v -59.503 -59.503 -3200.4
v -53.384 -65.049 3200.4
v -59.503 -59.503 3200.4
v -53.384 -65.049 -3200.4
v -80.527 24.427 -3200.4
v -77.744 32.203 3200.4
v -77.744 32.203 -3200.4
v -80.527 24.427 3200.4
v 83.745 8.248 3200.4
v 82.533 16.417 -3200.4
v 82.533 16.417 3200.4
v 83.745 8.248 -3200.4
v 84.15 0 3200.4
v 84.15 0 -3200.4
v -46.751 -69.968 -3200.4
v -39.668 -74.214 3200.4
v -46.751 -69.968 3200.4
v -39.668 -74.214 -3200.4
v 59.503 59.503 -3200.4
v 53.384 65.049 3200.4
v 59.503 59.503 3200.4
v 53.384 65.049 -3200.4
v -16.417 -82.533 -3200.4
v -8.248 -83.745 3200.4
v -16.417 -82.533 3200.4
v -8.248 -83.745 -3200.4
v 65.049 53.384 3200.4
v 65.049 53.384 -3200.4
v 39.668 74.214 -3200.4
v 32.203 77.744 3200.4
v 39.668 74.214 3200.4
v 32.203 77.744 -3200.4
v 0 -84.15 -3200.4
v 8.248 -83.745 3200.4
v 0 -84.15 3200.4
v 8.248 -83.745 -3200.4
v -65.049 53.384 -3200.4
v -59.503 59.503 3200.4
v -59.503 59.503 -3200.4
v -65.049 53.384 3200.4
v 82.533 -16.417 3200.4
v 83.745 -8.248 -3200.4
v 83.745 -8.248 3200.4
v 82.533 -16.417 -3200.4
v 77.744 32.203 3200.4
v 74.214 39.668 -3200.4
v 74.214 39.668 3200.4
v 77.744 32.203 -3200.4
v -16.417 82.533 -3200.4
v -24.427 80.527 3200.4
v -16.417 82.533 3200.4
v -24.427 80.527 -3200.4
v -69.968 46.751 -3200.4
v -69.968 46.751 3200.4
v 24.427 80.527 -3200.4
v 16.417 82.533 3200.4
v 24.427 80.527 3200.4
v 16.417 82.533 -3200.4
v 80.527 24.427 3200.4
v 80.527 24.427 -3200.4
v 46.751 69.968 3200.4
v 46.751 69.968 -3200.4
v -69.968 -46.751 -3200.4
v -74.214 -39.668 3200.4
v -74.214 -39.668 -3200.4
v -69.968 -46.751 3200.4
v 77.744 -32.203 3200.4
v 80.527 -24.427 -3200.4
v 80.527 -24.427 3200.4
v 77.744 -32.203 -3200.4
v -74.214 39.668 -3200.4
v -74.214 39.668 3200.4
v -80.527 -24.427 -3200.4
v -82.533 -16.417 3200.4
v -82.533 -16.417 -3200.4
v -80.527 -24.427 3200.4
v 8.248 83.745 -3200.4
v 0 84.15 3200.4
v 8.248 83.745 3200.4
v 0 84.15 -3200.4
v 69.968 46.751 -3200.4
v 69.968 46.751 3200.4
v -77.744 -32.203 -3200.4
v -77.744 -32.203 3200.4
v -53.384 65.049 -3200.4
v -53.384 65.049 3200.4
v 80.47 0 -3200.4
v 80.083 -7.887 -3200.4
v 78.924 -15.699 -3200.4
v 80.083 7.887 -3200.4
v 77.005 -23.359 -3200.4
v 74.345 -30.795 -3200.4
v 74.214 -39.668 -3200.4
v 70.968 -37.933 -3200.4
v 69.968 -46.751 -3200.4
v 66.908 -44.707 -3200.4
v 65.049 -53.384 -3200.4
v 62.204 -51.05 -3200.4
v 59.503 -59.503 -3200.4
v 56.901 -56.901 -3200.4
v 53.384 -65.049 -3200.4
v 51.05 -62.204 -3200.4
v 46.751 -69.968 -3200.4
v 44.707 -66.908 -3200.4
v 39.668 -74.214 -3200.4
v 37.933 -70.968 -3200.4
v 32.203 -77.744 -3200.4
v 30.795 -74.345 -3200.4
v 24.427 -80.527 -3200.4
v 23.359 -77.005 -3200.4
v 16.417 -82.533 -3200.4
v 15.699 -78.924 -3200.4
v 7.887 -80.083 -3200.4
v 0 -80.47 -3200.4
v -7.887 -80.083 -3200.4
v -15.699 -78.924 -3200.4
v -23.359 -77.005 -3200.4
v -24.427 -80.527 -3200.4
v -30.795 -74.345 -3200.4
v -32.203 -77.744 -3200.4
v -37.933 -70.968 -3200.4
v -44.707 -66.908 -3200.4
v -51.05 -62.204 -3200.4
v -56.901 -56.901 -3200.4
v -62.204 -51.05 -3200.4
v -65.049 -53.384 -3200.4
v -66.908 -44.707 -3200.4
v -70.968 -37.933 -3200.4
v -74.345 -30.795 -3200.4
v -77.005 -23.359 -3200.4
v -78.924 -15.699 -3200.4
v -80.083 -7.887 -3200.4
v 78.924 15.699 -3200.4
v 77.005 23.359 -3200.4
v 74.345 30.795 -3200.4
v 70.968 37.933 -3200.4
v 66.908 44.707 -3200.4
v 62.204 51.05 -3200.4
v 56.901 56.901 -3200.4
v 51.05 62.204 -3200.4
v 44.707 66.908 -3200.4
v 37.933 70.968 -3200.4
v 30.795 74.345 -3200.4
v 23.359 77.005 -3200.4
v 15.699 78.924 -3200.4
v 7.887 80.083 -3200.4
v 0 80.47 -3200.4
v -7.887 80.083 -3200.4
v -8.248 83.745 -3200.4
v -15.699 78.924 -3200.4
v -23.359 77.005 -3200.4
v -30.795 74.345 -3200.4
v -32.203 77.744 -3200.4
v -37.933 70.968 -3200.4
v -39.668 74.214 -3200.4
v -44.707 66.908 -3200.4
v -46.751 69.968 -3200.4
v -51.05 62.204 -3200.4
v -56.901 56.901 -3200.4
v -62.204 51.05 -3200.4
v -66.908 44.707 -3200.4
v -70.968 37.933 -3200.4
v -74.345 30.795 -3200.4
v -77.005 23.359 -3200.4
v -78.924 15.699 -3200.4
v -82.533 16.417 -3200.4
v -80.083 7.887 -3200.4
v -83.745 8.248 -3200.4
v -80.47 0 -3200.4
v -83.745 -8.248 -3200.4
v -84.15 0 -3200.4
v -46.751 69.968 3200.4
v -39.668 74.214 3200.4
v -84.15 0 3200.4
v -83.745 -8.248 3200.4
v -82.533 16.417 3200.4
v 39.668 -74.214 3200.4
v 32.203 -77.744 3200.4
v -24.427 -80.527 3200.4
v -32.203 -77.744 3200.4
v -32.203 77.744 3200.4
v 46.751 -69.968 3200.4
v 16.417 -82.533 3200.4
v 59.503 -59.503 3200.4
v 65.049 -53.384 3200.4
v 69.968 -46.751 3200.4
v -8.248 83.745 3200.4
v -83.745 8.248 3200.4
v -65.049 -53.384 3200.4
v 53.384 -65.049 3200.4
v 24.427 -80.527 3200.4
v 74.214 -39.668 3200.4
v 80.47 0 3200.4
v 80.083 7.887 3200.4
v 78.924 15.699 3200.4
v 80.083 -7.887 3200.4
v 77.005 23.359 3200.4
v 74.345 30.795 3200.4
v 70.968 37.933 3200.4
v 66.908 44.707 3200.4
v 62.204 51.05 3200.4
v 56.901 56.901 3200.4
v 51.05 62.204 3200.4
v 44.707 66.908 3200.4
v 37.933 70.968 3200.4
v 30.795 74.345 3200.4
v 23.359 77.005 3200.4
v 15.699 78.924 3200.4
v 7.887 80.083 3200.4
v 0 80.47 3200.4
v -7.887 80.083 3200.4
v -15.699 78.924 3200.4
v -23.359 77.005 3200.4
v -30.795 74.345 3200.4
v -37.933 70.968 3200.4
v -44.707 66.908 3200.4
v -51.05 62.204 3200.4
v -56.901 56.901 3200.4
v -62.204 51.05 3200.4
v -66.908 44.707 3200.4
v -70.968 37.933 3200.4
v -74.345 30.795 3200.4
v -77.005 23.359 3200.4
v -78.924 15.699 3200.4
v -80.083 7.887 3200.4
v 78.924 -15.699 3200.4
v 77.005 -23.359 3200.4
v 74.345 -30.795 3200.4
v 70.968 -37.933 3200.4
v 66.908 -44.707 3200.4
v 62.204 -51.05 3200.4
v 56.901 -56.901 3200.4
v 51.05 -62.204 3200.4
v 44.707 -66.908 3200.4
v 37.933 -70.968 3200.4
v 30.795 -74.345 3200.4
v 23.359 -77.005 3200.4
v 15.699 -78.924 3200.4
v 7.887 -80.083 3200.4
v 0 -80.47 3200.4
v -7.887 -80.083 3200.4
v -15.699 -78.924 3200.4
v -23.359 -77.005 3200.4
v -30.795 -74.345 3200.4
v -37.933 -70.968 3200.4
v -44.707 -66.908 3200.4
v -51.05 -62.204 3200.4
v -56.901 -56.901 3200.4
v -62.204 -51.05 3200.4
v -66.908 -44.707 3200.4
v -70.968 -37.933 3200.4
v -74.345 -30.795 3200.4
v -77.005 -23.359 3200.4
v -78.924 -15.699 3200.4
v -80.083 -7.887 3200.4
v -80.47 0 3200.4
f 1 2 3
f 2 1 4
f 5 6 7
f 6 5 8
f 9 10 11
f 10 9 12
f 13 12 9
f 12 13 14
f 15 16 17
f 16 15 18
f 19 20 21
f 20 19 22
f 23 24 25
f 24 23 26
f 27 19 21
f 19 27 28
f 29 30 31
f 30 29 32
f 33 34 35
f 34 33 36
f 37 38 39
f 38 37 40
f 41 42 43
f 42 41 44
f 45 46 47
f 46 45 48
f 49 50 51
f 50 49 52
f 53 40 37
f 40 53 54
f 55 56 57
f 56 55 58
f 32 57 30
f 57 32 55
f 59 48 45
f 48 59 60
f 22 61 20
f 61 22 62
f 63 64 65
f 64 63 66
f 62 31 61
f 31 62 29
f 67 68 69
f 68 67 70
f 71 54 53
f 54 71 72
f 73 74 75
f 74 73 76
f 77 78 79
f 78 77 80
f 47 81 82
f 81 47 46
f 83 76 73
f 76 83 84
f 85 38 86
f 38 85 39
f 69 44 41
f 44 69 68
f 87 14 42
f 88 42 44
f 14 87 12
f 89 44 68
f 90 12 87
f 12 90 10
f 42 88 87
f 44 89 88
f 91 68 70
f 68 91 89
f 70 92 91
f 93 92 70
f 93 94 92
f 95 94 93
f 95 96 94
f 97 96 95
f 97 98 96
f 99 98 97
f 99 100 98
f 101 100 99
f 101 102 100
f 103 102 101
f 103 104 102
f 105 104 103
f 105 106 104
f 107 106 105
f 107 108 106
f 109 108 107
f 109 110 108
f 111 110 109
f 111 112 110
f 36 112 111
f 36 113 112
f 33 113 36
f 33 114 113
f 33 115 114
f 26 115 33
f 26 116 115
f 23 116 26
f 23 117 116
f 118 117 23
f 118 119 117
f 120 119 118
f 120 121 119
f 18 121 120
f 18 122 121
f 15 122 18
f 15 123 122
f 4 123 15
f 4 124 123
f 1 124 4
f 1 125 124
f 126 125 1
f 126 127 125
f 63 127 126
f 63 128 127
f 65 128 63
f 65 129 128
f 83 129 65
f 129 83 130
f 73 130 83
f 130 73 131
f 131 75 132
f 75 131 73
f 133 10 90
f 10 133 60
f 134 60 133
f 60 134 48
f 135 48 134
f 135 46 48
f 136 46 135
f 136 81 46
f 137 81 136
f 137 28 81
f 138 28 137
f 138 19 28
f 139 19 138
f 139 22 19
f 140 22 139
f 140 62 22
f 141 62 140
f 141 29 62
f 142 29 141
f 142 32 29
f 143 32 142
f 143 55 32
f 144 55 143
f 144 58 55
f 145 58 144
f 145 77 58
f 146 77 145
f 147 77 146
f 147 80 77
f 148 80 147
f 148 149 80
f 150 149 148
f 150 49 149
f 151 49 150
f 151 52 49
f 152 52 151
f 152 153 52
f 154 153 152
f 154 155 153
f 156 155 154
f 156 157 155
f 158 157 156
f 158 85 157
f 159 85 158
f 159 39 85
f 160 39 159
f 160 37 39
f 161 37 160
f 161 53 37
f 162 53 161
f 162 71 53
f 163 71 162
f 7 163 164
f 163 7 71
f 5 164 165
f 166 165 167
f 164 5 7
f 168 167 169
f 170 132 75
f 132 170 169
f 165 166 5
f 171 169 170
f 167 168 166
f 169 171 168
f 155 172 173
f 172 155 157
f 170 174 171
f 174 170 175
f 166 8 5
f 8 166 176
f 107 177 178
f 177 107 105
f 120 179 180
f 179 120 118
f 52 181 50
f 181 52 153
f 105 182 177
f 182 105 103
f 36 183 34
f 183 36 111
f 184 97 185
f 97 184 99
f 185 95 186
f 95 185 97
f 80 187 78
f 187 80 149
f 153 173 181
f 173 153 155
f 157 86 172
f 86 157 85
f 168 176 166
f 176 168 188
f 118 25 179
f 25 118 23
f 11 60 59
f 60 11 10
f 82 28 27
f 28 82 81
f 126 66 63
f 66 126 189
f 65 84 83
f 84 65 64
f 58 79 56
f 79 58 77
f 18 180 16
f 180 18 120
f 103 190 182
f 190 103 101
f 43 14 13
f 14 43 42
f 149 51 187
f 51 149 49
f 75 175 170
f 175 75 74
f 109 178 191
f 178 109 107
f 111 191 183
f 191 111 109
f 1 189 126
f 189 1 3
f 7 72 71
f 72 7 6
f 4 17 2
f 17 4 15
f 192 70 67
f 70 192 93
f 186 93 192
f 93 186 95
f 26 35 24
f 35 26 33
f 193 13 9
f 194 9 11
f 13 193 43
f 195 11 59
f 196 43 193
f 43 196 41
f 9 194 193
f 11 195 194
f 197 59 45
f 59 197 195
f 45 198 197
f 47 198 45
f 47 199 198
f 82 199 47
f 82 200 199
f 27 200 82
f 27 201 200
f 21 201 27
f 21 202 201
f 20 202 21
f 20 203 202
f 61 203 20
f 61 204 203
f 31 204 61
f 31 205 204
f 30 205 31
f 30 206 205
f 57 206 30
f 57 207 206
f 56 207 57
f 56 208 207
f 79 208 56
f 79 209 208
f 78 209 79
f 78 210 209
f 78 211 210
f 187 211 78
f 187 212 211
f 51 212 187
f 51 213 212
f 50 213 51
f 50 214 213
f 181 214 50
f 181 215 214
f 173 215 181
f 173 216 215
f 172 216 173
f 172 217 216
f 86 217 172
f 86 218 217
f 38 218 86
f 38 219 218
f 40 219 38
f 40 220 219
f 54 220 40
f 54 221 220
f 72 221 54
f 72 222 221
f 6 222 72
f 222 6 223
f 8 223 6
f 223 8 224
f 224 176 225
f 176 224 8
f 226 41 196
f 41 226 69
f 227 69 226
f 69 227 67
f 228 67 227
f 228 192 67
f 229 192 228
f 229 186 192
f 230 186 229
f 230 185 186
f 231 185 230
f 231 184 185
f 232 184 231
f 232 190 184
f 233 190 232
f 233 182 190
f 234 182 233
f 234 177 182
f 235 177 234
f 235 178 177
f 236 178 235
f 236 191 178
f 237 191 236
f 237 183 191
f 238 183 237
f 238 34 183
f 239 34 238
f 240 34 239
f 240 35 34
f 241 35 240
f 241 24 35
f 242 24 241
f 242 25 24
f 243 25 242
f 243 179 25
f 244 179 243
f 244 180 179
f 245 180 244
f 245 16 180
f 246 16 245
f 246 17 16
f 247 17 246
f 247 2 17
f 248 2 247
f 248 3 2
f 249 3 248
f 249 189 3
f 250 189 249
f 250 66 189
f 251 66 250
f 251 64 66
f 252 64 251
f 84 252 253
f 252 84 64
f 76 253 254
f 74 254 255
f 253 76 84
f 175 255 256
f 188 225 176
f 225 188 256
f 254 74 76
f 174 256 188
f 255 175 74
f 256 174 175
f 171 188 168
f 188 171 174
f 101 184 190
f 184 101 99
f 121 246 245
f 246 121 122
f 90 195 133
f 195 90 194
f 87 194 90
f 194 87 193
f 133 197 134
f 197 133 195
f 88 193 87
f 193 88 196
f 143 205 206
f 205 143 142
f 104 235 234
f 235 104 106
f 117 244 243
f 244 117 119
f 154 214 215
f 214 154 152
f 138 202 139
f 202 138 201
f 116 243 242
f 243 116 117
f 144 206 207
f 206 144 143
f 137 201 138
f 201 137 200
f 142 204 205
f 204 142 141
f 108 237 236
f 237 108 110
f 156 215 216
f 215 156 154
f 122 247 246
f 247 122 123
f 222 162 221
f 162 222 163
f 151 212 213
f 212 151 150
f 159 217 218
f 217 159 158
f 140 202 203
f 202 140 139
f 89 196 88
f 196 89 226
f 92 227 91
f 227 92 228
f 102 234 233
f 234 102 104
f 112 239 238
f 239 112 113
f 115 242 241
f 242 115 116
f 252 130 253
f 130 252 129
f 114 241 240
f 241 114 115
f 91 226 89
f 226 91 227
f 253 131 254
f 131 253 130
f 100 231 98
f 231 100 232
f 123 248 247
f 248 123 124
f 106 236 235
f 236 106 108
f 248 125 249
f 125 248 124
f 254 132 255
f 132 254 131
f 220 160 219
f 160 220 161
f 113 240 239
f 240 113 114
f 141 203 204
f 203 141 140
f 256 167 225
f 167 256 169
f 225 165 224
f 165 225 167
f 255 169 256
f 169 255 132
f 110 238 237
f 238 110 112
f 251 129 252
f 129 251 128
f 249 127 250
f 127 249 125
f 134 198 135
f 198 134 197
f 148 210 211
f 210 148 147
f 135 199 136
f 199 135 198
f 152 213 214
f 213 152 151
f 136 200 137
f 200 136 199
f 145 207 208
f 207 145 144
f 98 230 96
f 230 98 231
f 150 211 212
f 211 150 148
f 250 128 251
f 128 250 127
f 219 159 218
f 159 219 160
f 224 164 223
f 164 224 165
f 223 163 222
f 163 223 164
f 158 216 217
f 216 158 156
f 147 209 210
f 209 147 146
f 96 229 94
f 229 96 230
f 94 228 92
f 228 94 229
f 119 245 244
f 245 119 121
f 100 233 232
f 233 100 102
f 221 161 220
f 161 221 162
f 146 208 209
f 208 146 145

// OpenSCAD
// Auto-generated by scripts/author_from_manifest.py (Phase D.3).
// Source: data/phase_d_manifest.json (sku_intent='wheatland-sch40-black-6in-21ft').
// Do not hand-edit — regenerate from the manifest.
//
// @part wheatland_sch40_black_6in_21ft
// @kind pipe_segment
// @category pipe.sch40.black.steel
// @display-name "Sch40 Black Steel 6\" x 21ft"
// @mfg wheatland_tube
// @price-usd 87.00
// @install-minutes 12
// @crew journeyman
// @param size_in number default=6 label="Size" unit="in"
// @port inlet position=[0,0,-0.5] direction=[0,0,-1] style=grooved size_in=6 role=run_a
// @port outlet position=[0,0,0.5] direction=[0,0,1] style=grooved size_in=6 role=run_b

size_in  = 6.0;
length_m = 6.4008;
schedule = "sch10";

function od_mm(nps) =
    nps ==  0.75 ? 26.7 :
    nps ==   1  ? 33.4 :
    nps == 1.25 ? 42.2 :
    nps == 1.5  ? 48.3 :
    nps ==   2  ? 60.3 :
    nps == 2.5  ? 73.0 :
    nps ==   3  ? 88.9 :
    nps ==   4  ? 114.3 :
    nps ==   5  ? 141.3 :
    nps ==   6  ? 168.3 :
    nps ==   8  ? 219.1 :
    nps ==  10  ? 273.0 : 60.3;

function wall_mm(nps, sched) =
    sched == "sch40"
        ? (nps <= 1.5 ? 3.68 : nps <= 3 ? 5.49 : 6.02)
        : (nps <= 1.5 ? 2.77 : nps <= 3 ? 3.05 : 3.68);

od = od_mm(size_in);
id = od - 2 * wall_mm(size_in, schedule);
len_mm = length_m * 1000;

difference() {
    cylinder(h = len_mm, d = od, center = true, $fn = 64);
    cylinder(h = len_mm + 1, d = id, center = true, $fn = 64);
}
